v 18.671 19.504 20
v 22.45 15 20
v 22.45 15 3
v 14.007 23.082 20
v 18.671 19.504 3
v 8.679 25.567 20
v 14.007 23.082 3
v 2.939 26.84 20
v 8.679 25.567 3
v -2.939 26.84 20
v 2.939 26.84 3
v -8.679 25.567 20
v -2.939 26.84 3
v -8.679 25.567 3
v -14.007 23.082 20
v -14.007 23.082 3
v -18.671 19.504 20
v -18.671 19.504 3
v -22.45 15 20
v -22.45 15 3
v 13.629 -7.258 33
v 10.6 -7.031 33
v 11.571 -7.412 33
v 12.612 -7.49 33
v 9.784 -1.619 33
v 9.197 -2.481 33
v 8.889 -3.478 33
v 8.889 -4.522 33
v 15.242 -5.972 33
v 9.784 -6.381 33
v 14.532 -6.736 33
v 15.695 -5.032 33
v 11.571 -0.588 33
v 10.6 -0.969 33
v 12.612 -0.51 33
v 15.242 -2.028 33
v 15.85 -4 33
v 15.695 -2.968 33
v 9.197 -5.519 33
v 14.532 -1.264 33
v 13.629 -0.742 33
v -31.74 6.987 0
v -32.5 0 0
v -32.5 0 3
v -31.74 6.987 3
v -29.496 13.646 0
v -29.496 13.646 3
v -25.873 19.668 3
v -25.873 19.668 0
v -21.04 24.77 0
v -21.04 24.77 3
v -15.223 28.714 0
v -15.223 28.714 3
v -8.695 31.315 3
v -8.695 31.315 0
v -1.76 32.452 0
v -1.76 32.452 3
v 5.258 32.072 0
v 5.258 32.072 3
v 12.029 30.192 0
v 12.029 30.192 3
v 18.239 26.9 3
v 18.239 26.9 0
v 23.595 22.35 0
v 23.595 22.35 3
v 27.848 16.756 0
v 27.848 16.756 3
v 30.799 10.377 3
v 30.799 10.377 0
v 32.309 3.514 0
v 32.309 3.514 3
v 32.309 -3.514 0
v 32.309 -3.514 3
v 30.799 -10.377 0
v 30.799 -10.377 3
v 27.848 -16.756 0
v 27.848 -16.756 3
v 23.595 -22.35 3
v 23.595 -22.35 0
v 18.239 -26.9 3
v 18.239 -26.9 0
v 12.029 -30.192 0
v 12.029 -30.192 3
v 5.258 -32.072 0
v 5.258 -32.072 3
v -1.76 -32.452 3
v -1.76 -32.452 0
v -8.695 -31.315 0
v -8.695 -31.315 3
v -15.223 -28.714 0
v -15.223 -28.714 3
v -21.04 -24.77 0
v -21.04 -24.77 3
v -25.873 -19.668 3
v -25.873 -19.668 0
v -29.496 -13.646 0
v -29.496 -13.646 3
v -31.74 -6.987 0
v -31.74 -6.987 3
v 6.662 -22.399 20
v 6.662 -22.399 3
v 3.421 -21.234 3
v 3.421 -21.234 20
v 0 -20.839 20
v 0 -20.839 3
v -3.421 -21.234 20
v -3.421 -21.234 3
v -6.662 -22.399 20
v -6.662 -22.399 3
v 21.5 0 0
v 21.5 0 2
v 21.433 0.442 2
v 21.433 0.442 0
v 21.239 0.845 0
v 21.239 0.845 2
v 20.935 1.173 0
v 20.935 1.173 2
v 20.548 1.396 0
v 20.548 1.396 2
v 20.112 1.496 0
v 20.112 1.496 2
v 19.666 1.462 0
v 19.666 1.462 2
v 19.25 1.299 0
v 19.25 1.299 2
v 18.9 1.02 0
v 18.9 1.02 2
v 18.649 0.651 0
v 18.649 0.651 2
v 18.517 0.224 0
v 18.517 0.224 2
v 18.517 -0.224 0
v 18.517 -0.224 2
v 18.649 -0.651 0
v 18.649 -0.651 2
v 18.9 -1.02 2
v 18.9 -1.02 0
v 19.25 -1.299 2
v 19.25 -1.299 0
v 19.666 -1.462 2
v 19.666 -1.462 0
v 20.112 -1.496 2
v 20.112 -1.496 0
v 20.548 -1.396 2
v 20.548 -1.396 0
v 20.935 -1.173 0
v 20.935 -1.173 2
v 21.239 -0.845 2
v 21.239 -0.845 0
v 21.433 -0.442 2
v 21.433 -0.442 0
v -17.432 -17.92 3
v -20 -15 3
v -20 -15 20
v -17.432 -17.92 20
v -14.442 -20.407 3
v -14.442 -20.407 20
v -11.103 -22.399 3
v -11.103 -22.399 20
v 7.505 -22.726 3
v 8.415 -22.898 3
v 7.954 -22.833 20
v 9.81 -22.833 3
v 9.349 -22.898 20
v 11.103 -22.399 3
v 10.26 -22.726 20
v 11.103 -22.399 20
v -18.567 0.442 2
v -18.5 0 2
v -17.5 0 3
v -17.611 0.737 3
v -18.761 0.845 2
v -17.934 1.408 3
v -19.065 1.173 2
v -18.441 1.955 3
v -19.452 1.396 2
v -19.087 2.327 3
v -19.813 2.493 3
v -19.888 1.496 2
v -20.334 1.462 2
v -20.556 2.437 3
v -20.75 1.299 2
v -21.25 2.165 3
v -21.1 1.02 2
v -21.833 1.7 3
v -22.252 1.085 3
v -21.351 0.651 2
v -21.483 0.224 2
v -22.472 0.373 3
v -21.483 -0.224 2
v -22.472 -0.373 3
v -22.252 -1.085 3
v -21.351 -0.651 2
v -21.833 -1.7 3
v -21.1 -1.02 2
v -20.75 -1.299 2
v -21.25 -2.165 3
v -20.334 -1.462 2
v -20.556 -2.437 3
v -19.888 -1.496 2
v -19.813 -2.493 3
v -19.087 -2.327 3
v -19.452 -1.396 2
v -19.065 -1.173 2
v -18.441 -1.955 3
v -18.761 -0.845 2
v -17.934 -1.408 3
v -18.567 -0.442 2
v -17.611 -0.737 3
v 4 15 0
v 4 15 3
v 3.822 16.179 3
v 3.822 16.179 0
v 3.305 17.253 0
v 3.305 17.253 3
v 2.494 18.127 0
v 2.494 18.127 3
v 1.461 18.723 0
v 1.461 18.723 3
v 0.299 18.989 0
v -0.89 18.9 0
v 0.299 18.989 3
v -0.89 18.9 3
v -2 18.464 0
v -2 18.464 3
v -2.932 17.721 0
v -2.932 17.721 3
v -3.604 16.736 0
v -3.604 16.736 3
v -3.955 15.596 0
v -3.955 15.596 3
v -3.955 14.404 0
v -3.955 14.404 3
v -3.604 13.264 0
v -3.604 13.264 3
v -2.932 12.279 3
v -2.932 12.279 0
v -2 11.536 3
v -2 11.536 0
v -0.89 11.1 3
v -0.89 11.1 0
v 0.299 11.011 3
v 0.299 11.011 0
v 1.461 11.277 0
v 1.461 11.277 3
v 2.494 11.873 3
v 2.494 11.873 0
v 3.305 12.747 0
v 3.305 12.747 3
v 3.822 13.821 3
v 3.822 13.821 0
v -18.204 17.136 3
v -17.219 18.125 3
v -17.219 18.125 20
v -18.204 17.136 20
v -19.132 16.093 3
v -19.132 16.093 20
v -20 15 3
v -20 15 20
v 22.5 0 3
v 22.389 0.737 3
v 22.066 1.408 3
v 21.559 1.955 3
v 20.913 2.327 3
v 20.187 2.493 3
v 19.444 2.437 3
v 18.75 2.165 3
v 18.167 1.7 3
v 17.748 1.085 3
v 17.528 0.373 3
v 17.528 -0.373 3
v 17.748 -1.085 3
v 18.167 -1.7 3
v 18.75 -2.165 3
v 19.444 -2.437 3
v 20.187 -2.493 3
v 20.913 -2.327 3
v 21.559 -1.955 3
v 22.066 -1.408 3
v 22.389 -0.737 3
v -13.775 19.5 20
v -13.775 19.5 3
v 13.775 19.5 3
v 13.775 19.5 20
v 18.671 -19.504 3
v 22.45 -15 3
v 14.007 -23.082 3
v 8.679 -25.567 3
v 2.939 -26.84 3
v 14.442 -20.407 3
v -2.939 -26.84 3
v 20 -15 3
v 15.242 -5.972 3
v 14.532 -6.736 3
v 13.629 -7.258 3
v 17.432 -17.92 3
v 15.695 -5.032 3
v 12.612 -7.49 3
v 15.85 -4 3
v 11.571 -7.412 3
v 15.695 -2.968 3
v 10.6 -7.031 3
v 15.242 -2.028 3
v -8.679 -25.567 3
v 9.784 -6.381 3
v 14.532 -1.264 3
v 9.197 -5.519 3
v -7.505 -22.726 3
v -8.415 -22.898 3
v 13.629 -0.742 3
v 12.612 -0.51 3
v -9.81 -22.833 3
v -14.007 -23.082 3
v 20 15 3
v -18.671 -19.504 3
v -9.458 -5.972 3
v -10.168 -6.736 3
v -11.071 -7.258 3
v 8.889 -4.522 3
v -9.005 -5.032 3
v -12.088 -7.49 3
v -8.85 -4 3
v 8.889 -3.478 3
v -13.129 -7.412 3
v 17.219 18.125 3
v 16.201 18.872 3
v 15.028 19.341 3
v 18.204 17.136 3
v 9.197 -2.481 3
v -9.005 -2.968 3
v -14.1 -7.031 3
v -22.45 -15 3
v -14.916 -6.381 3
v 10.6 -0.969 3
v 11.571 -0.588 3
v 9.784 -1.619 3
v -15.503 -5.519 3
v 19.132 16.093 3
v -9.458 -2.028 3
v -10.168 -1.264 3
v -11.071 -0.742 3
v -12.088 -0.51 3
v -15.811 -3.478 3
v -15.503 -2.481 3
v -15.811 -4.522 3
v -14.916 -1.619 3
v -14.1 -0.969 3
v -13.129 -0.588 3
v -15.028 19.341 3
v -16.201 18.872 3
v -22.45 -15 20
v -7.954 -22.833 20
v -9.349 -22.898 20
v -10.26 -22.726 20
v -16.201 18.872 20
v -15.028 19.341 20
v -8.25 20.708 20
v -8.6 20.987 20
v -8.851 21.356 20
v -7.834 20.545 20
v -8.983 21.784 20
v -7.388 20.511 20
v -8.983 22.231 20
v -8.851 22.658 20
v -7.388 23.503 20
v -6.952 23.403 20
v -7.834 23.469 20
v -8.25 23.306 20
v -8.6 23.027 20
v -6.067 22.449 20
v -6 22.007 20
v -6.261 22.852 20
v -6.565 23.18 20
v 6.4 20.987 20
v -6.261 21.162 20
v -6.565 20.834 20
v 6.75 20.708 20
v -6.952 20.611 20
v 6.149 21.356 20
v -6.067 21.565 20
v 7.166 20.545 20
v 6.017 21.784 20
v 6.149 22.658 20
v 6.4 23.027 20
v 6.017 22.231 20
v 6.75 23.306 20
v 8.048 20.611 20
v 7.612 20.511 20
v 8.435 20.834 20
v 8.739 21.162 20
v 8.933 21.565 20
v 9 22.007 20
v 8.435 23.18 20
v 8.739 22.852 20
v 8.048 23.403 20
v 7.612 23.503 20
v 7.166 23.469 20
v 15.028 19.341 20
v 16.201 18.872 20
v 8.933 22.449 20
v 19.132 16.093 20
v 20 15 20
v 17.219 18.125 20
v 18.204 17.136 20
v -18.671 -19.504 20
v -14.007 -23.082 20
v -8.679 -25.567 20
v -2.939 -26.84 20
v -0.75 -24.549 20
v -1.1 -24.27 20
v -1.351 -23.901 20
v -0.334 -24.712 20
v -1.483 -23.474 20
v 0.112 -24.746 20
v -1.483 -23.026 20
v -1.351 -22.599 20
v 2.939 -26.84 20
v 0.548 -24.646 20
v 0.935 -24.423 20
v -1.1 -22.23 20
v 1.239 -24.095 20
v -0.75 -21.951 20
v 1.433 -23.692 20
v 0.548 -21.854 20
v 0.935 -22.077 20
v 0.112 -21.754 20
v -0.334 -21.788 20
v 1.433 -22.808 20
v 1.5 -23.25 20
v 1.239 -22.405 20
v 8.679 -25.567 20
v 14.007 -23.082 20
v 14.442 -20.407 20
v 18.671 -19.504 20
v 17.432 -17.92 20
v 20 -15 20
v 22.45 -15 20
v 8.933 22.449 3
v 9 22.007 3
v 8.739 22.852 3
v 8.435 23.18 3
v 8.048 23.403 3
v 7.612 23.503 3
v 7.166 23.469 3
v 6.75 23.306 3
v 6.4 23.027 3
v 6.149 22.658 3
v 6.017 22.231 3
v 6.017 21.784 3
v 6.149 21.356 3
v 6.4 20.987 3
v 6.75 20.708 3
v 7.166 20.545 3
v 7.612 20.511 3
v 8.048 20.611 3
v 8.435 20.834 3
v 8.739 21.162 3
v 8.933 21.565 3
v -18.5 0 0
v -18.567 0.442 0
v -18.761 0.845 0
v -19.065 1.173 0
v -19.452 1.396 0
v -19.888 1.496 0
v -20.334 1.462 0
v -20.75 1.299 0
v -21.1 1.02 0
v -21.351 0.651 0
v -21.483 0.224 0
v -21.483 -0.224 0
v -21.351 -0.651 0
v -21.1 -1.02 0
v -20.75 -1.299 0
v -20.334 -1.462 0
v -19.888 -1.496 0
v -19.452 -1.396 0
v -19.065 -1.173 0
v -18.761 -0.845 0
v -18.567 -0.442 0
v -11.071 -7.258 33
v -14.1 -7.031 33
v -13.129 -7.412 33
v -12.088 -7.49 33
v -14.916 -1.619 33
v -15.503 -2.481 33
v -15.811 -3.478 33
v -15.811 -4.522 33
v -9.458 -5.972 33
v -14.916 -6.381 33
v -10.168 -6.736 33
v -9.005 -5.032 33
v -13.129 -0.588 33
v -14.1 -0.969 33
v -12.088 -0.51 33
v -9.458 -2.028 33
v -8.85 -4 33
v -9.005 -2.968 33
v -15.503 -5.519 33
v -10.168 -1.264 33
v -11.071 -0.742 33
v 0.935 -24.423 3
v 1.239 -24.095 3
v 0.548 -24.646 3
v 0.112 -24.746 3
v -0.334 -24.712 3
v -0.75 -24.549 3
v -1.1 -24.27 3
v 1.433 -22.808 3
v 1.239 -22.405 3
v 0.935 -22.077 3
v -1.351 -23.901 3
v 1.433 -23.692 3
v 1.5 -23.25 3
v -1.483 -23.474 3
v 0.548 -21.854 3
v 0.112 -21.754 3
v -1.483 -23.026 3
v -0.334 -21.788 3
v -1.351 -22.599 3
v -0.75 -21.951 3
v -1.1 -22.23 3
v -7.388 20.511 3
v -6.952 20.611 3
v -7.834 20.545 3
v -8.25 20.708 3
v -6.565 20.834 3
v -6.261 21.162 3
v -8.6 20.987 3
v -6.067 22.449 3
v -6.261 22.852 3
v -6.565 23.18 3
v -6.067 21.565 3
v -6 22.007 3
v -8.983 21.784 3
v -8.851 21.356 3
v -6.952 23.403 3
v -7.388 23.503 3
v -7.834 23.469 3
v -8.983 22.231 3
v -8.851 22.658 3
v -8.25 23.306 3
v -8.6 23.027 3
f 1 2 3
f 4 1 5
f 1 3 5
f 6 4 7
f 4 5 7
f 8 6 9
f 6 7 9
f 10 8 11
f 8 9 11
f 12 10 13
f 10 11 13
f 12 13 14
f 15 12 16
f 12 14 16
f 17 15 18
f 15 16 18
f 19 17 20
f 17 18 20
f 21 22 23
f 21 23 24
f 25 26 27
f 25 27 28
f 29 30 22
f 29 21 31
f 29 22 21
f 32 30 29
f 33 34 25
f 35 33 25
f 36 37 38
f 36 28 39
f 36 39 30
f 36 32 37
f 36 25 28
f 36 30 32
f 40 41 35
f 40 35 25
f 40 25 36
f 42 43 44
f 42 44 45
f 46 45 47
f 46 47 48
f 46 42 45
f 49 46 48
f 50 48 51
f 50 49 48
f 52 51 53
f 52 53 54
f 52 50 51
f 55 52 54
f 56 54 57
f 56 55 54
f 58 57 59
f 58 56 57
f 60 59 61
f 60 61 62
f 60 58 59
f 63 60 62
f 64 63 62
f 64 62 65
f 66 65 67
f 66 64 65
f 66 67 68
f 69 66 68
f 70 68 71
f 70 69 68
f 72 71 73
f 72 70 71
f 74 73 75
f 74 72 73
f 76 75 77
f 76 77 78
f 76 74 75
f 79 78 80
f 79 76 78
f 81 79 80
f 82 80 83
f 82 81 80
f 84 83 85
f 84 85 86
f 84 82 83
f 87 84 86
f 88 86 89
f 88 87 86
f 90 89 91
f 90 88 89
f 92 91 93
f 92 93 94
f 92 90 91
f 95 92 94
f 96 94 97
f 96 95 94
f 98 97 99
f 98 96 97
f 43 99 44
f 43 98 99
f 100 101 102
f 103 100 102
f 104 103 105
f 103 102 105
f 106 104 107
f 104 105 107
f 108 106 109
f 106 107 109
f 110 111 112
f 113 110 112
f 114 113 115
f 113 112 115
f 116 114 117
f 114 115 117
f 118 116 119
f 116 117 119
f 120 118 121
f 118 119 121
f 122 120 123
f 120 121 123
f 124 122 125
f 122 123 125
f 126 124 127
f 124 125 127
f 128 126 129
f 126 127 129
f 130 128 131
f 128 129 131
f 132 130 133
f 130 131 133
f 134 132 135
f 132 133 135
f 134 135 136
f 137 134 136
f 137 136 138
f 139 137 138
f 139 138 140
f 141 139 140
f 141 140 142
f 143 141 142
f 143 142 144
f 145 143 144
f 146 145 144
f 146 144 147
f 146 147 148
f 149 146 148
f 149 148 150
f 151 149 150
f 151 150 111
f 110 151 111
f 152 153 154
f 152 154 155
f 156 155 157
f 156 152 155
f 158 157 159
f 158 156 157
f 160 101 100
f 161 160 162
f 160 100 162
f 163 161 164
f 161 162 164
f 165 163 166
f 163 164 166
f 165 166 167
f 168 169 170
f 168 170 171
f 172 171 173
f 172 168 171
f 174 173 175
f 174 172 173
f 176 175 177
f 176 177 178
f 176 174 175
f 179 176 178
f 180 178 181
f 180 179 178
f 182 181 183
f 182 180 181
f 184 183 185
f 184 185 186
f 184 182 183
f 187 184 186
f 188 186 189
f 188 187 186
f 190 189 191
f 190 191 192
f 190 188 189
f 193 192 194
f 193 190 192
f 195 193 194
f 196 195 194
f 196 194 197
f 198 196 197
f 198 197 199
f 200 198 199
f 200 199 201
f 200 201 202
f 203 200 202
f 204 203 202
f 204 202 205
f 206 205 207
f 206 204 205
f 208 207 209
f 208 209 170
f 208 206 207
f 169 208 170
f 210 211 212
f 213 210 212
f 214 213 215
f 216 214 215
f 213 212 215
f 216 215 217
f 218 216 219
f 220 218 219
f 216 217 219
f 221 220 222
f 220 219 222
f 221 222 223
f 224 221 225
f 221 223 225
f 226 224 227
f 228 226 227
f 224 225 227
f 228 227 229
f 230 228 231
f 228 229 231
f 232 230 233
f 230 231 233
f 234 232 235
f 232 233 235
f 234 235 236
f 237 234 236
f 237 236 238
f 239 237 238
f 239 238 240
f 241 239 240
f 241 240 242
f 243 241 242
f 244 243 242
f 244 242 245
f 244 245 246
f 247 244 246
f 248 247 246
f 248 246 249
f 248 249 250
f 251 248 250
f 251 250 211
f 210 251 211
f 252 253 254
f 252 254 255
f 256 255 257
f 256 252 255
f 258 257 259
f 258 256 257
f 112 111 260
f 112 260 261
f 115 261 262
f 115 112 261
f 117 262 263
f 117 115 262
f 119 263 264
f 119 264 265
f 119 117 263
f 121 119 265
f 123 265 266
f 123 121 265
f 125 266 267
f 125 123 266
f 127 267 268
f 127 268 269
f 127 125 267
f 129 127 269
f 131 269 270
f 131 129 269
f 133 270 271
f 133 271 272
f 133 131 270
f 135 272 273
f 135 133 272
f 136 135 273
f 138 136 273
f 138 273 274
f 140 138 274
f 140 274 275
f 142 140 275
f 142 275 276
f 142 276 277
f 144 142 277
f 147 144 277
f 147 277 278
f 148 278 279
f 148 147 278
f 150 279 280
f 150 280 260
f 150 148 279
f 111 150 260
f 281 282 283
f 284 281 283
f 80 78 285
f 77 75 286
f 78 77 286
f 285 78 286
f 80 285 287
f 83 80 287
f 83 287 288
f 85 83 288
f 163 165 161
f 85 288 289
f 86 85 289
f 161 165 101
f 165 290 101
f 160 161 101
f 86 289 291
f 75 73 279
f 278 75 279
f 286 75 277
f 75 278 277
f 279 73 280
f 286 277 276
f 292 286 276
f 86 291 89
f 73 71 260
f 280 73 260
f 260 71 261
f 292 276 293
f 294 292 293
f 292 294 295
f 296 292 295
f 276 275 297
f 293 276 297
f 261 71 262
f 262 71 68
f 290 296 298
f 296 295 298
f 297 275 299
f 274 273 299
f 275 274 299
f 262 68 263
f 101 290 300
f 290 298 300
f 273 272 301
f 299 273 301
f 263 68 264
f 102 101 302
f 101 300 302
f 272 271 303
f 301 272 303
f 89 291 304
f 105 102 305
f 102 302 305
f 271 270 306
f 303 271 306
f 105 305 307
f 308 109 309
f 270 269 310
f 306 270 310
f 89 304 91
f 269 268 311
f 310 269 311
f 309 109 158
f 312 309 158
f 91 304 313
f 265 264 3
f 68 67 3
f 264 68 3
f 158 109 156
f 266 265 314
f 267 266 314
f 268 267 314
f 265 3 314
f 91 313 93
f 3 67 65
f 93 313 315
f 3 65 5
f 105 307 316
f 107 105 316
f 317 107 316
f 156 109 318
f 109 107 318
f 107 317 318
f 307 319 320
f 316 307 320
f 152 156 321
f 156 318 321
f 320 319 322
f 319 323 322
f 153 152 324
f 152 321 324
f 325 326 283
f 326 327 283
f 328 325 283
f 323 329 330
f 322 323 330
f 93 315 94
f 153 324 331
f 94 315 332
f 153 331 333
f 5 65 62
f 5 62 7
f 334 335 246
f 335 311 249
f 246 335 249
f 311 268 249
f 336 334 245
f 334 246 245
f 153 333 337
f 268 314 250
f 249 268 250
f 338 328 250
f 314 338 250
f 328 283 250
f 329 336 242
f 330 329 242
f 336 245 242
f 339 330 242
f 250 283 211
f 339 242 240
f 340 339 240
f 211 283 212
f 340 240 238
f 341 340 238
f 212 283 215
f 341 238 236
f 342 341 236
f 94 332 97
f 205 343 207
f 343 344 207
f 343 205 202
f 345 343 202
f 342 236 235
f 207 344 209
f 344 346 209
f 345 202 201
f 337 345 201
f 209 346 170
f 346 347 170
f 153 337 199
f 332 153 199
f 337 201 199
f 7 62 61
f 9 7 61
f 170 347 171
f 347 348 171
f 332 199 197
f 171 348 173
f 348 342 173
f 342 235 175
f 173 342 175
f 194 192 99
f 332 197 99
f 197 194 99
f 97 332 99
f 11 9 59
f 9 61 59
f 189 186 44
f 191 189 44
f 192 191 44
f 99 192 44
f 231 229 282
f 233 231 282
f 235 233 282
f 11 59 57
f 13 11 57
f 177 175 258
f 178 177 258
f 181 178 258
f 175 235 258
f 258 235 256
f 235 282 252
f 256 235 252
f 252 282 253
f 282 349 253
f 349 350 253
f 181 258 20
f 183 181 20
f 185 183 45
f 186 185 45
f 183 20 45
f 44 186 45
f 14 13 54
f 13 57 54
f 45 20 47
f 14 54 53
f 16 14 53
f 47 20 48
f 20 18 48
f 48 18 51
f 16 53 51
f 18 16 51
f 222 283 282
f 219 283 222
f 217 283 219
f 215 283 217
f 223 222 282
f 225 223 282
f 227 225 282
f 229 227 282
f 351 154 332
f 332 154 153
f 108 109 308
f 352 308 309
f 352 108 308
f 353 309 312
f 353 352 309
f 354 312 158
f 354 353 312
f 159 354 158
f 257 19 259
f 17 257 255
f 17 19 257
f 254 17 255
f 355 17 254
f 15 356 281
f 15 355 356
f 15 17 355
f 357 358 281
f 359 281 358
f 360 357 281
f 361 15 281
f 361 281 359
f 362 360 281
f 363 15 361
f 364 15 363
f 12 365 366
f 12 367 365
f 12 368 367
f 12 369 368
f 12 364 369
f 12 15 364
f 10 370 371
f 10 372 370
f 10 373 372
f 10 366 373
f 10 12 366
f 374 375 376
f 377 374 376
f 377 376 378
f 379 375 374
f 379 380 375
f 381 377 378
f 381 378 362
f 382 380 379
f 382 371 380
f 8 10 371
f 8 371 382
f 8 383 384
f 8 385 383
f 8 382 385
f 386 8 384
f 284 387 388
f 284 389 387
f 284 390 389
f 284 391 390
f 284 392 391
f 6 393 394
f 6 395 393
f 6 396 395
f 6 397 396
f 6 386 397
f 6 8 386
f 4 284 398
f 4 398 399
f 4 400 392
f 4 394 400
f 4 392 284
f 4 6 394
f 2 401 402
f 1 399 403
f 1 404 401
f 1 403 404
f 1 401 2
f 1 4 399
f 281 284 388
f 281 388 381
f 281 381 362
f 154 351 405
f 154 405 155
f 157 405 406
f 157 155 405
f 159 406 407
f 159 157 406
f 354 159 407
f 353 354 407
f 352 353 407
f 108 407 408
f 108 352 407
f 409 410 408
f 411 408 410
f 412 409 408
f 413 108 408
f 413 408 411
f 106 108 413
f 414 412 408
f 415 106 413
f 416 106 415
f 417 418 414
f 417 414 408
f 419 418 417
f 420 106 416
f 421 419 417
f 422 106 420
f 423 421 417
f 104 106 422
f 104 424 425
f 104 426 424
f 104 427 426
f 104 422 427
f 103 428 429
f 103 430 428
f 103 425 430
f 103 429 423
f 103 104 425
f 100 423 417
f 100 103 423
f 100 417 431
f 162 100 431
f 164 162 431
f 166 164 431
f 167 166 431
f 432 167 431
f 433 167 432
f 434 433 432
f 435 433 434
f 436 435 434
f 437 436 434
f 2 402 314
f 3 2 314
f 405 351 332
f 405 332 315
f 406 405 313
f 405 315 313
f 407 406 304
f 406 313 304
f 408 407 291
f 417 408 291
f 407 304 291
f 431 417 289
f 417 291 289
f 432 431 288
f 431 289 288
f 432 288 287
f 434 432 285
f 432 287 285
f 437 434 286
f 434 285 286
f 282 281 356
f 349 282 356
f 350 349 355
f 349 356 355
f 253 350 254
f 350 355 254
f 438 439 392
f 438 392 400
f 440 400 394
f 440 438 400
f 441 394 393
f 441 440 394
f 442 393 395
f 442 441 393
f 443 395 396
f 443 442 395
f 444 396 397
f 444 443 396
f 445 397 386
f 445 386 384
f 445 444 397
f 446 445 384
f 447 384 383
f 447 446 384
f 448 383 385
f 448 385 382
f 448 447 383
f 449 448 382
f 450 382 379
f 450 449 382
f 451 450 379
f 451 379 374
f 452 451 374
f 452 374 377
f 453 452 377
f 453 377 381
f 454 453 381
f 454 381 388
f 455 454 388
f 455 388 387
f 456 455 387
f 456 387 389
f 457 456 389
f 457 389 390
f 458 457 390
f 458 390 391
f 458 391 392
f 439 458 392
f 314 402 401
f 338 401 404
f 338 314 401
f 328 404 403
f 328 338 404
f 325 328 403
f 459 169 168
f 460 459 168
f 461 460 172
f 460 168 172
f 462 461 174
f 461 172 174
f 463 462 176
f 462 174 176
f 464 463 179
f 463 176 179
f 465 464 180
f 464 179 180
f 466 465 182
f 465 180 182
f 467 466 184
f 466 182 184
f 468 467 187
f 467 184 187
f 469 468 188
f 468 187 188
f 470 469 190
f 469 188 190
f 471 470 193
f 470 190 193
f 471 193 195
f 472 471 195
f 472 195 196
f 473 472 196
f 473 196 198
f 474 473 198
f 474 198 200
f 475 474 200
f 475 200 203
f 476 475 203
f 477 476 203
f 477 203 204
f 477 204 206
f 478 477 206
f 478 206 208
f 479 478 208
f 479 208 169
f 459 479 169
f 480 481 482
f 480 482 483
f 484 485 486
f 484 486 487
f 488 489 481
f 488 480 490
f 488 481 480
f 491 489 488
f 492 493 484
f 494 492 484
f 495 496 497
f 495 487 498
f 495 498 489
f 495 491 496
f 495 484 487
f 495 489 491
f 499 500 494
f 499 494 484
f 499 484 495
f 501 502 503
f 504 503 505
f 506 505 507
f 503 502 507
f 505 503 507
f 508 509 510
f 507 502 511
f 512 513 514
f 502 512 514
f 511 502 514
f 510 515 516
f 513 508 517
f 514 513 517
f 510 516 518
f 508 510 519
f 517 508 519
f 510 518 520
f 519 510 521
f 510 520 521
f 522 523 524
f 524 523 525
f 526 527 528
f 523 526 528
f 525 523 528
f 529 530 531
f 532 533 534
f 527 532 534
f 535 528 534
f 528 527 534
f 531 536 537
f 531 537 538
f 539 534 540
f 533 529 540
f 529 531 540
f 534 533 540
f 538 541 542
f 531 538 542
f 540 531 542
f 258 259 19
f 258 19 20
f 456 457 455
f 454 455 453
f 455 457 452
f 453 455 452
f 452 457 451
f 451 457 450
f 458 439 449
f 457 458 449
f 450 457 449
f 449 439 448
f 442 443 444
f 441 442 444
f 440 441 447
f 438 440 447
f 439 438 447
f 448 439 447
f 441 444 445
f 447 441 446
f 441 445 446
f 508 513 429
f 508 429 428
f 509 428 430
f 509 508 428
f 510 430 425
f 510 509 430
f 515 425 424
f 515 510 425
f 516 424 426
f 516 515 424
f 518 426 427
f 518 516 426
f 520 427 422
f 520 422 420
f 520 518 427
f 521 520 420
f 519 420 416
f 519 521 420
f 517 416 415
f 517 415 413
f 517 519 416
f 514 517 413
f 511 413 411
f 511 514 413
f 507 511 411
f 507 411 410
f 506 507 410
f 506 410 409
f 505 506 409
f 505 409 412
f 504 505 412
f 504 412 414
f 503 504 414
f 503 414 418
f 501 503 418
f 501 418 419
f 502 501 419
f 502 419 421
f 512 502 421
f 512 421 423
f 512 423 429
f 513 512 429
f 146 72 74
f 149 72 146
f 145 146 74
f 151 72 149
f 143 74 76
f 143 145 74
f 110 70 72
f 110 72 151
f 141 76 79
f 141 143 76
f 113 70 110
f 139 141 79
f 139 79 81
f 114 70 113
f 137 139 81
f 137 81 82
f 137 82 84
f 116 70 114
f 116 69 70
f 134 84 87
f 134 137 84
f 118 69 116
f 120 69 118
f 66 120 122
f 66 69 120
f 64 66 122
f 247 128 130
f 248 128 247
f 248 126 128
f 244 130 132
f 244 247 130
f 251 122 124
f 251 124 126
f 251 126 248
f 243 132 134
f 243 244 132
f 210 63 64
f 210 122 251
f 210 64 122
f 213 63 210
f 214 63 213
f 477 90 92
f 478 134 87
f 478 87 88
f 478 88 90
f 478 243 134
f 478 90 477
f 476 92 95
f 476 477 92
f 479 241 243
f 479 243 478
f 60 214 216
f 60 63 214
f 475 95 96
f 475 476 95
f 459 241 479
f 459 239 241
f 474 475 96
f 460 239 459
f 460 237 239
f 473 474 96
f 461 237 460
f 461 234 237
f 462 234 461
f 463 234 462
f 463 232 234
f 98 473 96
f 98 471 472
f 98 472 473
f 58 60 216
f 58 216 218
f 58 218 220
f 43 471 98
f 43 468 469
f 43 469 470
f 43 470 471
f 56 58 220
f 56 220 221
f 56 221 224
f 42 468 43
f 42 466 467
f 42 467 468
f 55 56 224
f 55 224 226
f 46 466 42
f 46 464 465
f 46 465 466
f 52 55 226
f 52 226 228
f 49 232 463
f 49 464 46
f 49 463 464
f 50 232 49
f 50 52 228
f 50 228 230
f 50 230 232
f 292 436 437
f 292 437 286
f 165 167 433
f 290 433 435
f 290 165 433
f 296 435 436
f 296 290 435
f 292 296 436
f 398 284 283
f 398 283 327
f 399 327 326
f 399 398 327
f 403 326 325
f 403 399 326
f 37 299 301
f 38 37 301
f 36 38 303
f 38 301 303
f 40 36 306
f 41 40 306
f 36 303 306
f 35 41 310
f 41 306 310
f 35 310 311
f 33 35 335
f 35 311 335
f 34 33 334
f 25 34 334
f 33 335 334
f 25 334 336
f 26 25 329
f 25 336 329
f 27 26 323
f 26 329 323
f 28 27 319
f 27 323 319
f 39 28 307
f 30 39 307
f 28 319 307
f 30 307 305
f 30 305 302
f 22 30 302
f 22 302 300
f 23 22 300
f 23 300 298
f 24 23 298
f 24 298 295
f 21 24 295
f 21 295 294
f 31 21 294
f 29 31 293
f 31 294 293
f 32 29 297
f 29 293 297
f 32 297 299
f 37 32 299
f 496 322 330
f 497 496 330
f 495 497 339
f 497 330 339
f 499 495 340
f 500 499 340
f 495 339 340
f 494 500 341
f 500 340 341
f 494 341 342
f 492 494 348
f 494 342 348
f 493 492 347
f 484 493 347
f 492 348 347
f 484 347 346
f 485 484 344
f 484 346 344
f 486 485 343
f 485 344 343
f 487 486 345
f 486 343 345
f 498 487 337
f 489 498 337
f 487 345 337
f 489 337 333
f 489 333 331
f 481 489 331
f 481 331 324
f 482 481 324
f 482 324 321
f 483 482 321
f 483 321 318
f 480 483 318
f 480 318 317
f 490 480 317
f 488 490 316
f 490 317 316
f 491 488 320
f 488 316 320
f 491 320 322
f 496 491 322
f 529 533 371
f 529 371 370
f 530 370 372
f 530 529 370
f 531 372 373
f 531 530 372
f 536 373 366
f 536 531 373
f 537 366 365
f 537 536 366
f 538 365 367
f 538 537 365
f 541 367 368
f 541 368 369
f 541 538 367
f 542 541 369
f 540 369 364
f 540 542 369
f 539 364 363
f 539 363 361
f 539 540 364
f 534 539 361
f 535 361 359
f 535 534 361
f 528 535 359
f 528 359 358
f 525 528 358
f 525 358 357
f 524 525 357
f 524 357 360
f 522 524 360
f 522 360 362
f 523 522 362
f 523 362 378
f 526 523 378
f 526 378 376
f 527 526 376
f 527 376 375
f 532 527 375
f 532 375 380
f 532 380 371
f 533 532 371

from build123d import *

# Parameters (mm, degrees)
SKETCH3_R               = 27
SKETCH3_R_2             = 25
BOSS_EXTRUDE2_DEPTH     = 20
SKETCH4_W               = 21.394887062
SKETCH4_H               = 30
CUT_EXTRUDE1_DEPTH      = 28
CUT_EXTRUDE1_DEPTH_BACK = 28
SKETCH5_R               = 1.5
BOSS_EXTRUDE3_DEPTH     = 20
FILLET2_R               = 5
SKETCH6_R               = 32.5
BOSS_EXTRUDE4_DEPTH     = 3
SKETCH7_R               = 4
CUT_EXTRUDE2_DEPTH      = 4
SKETCH8_R               = 1.5
CUT_EXTRUDE3_DEPTH      = 4
CHAMFER1_SIZE           = 1
SKETCH9_R               = 3.5
BOSS_EXTRUDE5_DEPTH     = 30


with BuildPart() as part:
    # Sketch3 → Boss-Extrude2 (new body)
    with BuildSketch(Plane.XY):
        Circle(SKETCH3_R)
        Circle(SKETCH3_R_2, mode=Mode.SUBTRACT)
    extrude(amount=BOSS_EXTRUDE2_DEPTH)

    # Sketch4 → Cut-Extrude1 (cut, two sides)
    with BuildSketch(Plane(origin=(0, 0, 0), x_dir=(0, 0, -1), z_dir=(1, 0, 0))) as cut_extrude1_sk:
        with Locations((-13.697443531, 0)):
            Rectangle(SKETCH4_W, SKETCH4_H)
    extrude(amount=CUT_EXTRUDE1_DEPTH, mode=Mode.SUBTRACT)
    extrude(cut_extrude1_sk.sketch, amount=-CUT_EXTRUDE1_DEPTH_BACK, mode=Mode.SUBTRACT)

    # Sketch5 → Boss-Extrude3 (add)
    with BuildSketch(Plane.XY):
        with BuildLine():
            Line((-15.644487847, 19.5), (15.644487847, 19.5))
            ThreePointArc((15.644487847, 19.5), (0, 26.287924728), (-15.644487847, 19.5))
        make_face()
        with Locations((-7.5, 22.007101127)):
            Circle(SKETCH5_R, mode=Mode.SUBTRACT)
        with Locations((7.5, 22.007101127)):
            Circle(SKETCH5_R, mode=Mode.SUBTRACT)
        with BuildLine():
            ThreePointArc((8.529361055, -23.5), (0, -20.838962679), (-8.529361055, -23.5))
            ThreePointArc((-8.529361055, -23.5), (0, -26.208671307), (8.529361055, -23.5))
        make_face()
        with Locations((0, -23.25)):
            Circle(SKETCH5_R, mode=Mode.SUBTRACT)
    extrude(amount=BOSS_EXTRUDE3_DEPTH)

    # Fillet2
    fillet2_edges = [part.edges().sort_by_distance(p)[0] for p in [
        (15.644487847, 19.5, 10),
        (-15.644487847, 19.5, 10),
        (-8.529361055, -23.5, 10),
        (8.529361055, -23.5, 10),
    ]]
    fillet(fillet2_edges, radius=FILLET2_R)

    # Sketch6 → Boss-Extrude4 (add)
    with BuildSketch(Plane(origin=(0, 0, 0), x_dir=(-1, 0, 0), z_dir=(0, 0, -1))):
        Circle(SKETCH6_R)
    extrude(amount=-BOSS_EXTRUDE4_DEPTH)

    # Sketch7 → Cut-Extrude2 (cut, through all)
    with BuildSketch(Plane.XY.offset(3)):
        with Locations((0, 15)):
            Circle(SKETCH7_R)
    extrude(amount=-CUT_EXTRUDE2_DEPTH, mode=Mode.SUBTRACT)

    # Sketch8 → Cut-Extrude3 (cut, through all)
    with BuildSketch(Plane.XY.offset(3)):
        with Locations((-20, 0)):
            Circle(SKETCH8_R)
        with Locations((20, 0)):
            Circle(SKETCH8_R)
    extrude(amount=-CUT_EXTRUDE3_DEPTH, mode=Mode.SUBTRACT)

    # Chamfer1
    chamfer1_edges = [part.edges().sort_by_distance(p)[0] for p in [
        (-21.5, 0, 3),
        (18.5, 0, 3),
    ]]
    chamfer(chamfer1_edges, length=CHAMFER1_SIZE)

    # Sketch9 → Boss-Extrude5 (add)
    with BuildSketch(Plane.XY.offset(3)):
        with Locations((-12.35, -4)):
            Circle(SKETCH9_R)
        with Locations((12.35, -4)):
            Circle(SKETCH9_R)
    extrude(amount=BOSS_EXTRUDE5_DEPTH)


solid = part.part
